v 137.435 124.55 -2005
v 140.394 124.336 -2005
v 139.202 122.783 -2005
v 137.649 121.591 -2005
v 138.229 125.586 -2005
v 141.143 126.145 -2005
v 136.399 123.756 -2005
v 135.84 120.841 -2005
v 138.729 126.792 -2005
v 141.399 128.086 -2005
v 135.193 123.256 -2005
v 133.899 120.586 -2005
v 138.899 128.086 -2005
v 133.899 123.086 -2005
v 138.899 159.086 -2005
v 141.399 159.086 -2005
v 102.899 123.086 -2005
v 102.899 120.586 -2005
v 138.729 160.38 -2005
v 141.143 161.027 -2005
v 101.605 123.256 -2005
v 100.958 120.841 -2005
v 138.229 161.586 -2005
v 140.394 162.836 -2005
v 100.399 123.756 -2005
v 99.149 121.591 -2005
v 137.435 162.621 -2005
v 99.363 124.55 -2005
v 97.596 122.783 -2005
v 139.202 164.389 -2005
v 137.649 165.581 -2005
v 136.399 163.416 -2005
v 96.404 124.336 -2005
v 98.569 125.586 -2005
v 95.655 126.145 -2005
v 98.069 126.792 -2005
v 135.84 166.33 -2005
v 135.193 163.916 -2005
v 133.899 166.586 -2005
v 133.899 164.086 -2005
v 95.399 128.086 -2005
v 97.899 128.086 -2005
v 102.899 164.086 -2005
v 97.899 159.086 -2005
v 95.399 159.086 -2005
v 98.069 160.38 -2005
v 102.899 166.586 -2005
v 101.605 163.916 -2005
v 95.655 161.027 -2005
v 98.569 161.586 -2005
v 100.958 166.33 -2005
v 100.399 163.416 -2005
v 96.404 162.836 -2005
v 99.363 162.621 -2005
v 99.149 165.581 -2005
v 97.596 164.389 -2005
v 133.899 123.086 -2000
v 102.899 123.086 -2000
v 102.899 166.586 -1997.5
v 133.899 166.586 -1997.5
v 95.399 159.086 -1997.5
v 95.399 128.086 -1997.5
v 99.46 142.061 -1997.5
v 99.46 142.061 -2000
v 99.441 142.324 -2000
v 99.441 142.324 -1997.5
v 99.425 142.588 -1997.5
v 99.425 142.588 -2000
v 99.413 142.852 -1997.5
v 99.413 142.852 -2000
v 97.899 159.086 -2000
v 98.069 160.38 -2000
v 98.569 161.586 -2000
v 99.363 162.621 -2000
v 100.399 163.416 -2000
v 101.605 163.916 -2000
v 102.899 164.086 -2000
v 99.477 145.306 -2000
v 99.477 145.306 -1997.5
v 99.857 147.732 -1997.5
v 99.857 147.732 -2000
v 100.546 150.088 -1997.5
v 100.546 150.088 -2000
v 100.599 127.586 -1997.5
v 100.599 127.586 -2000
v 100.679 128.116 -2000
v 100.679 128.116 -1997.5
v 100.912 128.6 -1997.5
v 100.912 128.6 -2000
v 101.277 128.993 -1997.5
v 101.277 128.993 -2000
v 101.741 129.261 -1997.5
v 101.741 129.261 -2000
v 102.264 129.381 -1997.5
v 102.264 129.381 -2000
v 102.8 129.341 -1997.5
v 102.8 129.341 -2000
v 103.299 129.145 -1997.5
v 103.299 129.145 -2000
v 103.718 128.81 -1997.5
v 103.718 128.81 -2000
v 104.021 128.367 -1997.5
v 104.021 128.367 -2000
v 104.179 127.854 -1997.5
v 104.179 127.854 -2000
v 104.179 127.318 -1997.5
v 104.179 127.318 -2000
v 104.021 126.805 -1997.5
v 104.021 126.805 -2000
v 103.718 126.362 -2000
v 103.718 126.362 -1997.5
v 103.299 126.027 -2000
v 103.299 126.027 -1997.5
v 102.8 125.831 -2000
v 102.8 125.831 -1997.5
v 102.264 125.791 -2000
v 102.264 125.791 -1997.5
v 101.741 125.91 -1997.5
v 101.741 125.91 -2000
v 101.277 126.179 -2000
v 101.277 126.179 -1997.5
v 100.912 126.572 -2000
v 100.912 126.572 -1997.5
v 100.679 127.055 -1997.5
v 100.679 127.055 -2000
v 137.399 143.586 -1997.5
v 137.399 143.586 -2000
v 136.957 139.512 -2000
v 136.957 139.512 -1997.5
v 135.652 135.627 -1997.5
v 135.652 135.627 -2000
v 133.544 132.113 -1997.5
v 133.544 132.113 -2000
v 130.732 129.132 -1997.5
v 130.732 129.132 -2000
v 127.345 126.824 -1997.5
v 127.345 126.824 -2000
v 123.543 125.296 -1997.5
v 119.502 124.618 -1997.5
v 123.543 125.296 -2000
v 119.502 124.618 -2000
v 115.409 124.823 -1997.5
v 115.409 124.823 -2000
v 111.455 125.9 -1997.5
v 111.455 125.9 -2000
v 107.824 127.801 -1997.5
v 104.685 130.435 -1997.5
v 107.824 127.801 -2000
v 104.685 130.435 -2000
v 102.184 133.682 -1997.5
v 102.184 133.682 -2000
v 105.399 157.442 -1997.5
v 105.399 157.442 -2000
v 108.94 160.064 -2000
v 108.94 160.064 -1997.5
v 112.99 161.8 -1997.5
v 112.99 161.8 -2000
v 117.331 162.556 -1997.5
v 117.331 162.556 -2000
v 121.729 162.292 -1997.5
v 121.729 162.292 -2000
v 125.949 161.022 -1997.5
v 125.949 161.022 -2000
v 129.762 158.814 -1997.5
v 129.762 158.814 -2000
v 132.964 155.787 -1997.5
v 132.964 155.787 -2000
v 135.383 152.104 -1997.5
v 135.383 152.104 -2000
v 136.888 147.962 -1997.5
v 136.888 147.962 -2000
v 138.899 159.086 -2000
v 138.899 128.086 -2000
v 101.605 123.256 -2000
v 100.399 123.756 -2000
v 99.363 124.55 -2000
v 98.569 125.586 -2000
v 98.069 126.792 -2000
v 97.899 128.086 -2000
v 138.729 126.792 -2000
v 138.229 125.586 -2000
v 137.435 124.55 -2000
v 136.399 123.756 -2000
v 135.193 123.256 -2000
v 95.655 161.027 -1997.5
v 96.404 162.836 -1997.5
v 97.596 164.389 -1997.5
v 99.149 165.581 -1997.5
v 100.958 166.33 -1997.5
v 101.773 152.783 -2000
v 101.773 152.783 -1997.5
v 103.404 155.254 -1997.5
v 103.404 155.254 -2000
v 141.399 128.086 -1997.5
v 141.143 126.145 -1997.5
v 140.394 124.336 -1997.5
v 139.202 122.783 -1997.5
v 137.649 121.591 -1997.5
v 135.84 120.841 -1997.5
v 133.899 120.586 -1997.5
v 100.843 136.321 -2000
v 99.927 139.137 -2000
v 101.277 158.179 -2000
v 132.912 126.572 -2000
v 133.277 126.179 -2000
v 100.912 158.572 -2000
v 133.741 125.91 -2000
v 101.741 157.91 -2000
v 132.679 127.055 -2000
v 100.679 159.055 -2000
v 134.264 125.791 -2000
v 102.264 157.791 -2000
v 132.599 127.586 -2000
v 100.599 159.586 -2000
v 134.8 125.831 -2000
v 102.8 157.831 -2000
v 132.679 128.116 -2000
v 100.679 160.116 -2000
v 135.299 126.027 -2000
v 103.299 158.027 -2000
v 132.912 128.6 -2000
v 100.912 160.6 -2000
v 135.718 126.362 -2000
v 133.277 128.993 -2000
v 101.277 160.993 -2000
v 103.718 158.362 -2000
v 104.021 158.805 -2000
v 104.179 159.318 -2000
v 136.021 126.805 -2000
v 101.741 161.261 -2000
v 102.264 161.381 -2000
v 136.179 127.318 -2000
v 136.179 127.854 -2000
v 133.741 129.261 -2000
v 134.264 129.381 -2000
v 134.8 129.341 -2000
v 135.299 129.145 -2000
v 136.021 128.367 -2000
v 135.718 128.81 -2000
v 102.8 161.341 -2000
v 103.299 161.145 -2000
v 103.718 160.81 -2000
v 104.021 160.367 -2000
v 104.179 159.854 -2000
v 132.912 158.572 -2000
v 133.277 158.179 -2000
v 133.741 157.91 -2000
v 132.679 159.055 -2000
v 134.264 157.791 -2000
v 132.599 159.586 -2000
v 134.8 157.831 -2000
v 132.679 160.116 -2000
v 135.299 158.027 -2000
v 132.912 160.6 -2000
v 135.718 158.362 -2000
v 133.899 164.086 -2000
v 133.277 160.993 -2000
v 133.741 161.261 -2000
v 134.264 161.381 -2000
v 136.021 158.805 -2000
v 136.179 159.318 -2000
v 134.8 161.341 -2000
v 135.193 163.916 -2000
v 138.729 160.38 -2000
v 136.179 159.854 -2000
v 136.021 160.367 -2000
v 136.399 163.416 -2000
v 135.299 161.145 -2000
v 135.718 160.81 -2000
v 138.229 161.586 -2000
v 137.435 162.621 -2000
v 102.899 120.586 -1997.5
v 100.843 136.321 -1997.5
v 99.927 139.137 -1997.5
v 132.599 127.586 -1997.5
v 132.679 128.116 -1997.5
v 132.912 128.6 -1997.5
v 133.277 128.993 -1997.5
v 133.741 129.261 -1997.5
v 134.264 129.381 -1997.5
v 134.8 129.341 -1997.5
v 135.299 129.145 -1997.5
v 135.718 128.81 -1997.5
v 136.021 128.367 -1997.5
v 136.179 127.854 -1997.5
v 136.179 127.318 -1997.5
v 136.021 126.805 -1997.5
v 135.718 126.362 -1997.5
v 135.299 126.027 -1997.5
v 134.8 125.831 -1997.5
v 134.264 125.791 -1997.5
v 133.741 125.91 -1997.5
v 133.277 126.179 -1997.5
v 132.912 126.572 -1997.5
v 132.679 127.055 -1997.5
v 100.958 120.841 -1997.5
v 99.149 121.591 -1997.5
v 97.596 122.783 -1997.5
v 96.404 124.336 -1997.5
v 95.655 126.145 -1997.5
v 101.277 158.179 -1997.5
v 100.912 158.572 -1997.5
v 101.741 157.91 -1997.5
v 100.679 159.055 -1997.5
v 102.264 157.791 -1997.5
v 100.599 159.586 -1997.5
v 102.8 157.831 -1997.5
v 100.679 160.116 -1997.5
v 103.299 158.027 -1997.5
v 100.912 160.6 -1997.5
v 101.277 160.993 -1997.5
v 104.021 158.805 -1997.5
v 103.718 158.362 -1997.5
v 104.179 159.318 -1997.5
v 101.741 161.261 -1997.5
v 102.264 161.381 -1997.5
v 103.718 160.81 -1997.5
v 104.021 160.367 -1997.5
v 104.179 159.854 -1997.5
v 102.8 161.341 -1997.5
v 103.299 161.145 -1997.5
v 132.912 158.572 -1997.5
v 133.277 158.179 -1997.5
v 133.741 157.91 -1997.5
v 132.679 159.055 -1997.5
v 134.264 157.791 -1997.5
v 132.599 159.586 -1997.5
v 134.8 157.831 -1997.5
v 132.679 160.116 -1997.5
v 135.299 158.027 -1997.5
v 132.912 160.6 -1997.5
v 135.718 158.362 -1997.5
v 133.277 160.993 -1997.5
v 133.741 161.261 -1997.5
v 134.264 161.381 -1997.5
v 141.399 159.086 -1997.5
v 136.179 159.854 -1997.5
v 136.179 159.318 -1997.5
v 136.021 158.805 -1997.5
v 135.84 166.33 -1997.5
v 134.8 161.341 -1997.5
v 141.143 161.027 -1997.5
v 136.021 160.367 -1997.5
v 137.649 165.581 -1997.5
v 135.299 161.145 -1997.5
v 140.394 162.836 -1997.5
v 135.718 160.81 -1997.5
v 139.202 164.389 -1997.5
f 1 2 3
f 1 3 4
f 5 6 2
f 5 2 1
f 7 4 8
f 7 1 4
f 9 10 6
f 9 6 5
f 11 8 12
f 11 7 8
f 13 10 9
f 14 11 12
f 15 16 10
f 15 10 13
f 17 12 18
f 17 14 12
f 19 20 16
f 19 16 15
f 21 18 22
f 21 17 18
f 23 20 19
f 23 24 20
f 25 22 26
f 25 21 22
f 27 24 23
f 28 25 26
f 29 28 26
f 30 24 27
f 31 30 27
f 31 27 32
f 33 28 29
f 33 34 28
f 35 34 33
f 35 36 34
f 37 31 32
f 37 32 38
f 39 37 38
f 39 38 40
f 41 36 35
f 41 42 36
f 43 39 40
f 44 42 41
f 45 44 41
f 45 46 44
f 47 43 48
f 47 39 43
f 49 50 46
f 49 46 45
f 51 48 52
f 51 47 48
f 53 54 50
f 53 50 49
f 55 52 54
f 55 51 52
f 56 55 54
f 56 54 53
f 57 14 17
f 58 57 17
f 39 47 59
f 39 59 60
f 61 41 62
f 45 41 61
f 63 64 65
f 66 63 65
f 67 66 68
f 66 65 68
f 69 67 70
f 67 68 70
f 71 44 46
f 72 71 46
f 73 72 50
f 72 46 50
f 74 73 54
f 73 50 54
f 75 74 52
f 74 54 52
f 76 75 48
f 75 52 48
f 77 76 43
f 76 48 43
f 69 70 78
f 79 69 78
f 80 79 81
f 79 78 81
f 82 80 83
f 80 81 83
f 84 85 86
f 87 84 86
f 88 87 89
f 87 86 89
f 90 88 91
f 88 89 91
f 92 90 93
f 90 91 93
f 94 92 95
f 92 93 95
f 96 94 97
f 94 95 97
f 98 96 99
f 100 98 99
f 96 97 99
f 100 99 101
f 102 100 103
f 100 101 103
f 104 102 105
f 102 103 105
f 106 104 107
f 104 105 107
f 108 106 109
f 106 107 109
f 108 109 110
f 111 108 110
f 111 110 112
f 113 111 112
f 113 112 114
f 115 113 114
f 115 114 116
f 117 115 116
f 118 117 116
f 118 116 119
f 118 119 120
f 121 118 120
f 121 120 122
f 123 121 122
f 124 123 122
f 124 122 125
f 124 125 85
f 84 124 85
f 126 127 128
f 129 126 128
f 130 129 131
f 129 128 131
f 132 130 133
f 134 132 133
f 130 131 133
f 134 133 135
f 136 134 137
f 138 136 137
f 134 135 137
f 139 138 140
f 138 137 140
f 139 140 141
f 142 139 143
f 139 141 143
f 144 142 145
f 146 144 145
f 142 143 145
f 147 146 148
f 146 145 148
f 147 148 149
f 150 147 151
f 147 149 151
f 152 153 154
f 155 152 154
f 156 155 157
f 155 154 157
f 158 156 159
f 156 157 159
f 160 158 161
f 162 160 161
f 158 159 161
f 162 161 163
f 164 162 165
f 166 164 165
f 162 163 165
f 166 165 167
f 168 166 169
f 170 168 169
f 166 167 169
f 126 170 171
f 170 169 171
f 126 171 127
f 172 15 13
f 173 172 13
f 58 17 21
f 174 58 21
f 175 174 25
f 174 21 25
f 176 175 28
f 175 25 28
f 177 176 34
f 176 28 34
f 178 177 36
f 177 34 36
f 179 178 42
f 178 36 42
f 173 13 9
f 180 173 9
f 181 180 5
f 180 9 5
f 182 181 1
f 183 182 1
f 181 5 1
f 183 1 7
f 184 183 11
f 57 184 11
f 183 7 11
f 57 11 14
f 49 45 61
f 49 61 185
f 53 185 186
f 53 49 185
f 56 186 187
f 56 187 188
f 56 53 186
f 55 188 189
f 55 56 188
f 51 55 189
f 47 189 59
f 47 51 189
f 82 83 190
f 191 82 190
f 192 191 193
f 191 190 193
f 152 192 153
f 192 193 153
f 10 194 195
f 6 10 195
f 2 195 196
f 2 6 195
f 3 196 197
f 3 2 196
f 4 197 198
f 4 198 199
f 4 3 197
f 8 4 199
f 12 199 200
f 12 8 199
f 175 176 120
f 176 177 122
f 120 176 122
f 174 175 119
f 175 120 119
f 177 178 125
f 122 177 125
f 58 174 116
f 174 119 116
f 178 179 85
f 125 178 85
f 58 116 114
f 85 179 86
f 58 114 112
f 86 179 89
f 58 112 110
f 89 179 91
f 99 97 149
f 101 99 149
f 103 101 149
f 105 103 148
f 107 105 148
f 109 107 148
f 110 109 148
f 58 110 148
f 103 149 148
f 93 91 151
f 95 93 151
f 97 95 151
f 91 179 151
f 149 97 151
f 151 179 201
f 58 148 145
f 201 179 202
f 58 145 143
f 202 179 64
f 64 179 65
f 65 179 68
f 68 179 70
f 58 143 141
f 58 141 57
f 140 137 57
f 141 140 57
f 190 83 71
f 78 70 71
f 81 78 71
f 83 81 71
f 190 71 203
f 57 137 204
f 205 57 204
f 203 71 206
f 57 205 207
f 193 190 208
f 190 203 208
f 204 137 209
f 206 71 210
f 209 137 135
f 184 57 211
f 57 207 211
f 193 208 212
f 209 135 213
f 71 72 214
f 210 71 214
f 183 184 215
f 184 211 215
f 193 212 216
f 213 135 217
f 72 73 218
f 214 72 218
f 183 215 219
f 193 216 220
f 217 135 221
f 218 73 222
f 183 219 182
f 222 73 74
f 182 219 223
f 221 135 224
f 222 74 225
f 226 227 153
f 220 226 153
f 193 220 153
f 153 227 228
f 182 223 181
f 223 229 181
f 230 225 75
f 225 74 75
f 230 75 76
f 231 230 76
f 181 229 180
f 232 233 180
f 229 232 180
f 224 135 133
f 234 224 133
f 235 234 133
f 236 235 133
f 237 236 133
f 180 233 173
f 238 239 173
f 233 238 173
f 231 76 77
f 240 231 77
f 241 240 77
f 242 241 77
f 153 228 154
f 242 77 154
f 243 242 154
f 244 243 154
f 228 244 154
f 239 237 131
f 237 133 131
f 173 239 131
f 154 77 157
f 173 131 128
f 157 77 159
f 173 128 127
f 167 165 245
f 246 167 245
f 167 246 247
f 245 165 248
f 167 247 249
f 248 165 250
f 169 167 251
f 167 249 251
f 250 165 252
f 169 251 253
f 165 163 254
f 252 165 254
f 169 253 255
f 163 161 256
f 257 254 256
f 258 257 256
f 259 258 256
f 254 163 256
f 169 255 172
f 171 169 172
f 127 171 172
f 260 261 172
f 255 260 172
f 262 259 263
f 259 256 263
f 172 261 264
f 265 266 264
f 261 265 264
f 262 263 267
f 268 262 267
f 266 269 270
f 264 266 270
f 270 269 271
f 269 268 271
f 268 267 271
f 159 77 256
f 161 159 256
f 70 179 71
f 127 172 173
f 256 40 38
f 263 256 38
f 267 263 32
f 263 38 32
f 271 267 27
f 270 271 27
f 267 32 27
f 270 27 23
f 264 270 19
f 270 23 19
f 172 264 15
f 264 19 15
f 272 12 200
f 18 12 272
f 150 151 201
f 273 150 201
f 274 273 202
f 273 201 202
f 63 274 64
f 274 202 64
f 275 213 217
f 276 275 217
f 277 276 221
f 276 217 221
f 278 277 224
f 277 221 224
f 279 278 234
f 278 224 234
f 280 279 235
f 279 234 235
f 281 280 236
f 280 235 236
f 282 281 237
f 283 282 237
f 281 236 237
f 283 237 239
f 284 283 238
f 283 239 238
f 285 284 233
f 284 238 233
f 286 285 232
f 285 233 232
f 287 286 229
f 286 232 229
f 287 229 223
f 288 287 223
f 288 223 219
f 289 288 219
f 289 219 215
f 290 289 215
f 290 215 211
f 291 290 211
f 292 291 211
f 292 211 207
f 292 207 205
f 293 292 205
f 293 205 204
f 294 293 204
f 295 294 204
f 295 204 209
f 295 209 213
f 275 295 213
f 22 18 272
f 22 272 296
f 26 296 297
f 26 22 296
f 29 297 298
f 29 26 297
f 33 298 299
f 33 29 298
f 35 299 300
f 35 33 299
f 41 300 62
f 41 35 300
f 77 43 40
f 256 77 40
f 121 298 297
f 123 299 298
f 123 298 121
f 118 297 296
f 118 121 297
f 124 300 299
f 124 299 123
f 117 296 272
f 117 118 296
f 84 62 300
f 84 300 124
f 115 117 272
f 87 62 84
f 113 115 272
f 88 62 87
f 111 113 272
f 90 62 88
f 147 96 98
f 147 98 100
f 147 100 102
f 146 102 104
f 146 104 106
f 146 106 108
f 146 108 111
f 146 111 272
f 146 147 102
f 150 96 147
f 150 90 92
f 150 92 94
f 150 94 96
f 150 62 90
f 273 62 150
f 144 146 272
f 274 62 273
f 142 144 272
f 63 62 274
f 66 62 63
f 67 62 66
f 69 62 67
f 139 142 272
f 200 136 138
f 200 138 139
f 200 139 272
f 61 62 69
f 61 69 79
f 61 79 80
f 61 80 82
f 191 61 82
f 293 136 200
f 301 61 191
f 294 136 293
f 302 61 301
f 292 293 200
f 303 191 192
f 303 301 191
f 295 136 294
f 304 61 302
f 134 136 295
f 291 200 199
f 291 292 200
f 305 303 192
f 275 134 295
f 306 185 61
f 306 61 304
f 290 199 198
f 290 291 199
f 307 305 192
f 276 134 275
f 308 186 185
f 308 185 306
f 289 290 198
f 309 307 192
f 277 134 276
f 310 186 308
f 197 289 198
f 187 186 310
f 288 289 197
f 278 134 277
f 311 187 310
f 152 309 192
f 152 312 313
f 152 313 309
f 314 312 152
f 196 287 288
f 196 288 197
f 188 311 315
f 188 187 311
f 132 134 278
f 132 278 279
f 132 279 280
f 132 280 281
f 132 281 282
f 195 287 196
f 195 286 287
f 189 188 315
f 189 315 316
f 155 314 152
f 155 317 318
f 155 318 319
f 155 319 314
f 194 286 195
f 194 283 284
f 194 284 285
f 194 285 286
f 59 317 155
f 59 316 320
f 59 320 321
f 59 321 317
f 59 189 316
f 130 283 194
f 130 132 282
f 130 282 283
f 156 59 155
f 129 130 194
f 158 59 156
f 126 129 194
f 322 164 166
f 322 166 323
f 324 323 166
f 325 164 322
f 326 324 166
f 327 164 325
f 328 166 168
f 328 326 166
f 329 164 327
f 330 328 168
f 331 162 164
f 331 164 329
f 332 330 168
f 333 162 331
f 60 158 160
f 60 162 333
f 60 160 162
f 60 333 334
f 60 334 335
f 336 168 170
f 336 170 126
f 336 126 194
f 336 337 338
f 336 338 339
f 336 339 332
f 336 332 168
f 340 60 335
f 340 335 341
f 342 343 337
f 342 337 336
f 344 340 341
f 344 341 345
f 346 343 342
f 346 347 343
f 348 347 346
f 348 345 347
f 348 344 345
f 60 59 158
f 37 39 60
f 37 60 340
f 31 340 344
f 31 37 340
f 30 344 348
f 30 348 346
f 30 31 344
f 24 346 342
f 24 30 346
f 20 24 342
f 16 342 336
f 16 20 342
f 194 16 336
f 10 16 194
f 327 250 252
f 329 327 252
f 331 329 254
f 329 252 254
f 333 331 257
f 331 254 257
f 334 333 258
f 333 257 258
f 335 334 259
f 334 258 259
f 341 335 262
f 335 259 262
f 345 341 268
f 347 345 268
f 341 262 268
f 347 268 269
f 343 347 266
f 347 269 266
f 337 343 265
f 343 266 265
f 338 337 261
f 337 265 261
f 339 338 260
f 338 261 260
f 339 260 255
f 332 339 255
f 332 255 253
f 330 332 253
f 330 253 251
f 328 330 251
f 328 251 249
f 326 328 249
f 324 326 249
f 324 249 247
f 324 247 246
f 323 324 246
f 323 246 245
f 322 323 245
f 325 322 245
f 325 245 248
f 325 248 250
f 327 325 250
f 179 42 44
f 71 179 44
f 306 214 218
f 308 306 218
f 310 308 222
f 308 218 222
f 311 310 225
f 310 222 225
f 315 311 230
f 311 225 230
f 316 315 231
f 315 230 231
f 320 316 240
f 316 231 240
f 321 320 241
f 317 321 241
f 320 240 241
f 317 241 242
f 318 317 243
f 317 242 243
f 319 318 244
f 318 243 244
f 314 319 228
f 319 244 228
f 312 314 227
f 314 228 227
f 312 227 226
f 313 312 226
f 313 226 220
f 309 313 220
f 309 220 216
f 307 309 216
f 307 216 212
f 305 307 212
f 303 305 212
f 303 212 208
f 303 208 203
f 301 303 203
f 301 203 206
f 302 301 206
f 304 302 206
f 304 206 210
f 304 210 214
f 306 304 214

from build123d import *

# Parameters (mm, degrees)
BOSS_EXTRUDE2_DEPTH  = 2.5
BOSS_EXTRUDE3_START  = 5
BOSS_EXTRUDE3_DEPTH  = 5
M3_CLEARANCE_HOLE1_D = 3.6


with BuildPart() as part:
    # Sketch2 → Boss-Extrude2 (new body)
    # profile 1 of 2: a face of its own
    with BuildSketch(Plane.XY.offset(-2000)):
        with BuildLine():
            Line((102.89897186, 166.585877116), (133.89897186, 166.585877116))
            ThreePointArc((133.89897186, 166.585877116), (139.202272719, 164.389177975), (141.39897186, 159.085877116))
            Line((141.39897186, 159.085877116), (141.39897186, 138.785877116))
            Line((141.39897186, 138.785877116), (141.39897186, 135.685877116))
            Line((141.39897186, 135.685877116), (141.39897186, 135.385877116))
            Line((141.39897186, 135.385877116), (141.39897186, 133.385877116))
            Line((141.39897186, 133.385877116), (141.39897186, 133.085877116))
            Line((141.39897186, 133.085877116), (141.39897186, 131.333076667))
            Line((141.39897186, 131.333076667), (141.39897186, 128.085877116))
            ThreePointArc((141.39897186, 128.085877116), (139.202272719, 122.782576257), (133.89897186, 120.585877116))
            Line((133.89897186, 120.585877116), (102.89897186, 120.585877116))
            ThreePointArc((102.89897186, 120.585877116), (97.595671001, 122.782576257), (95.39897186, 128.085877116))
            Line((95.39897186, 128.085877116), (95.39897186, 159.085877116))
            ThreePointArc((95.39897186, 159.085877116), (97.595671001, 164.389177975), (102.89897186, 166.585877116))
        make_face()
        with BuildLine():
            ThreePointArc((138.89897186, 159.085877116), (137.434505766, 162.621411022), (133.89897186, 164.085877116))
            Line((133.89897186, 164.085877116), (102.89897186, 164.085877116))
            ThreePointArc((102.89897186, 164.085877116), (99.363437954, 162.621411022), (97.89897186, 159.085877116))
            Line((97.89897186, 159.085877116), (97.89897186, 128.085877116))
            ThreePointArc((97.89897186, 128.085877116), (99.363437954, 124.55034321), (102.89897186, 123.085877116))
            Line((102.89897186, 123.085877116), (133.89897186, 123.085877116))
            ThreePointArc((133.89897186, 123.085877116), (137.434505766, 124.55034321), (138.89897186, 128.085877116))
            Line((138.89897186, 128.085877116), (138.89897186, 131.333076667))
            Line((138.89897186, 131.333076667), (138.89897186, 133.085877116))
            Line((138.89897186, 133.085877116), (138.89897186, 133.385877116))
            Line((138.89897186, 133.385877116), (138.89897186, 135.385877116))
            Line((138.89897186, 135.385877116), (138.89897186, 135.685877116))
            Line((138.89897186, 135.685877116), (138.89897186, 138.785877116))
            Line((138.89897186, 138.785877116), (138.89897186, 159.085877116))
        make_face(mode=Mode.SUBTRACT)
    # profile 2 of 2: a face of its own
    with BuildSketch(Plane.XY.offset(-2000)):
        with BuildLine():
            Line((138.89897186, 135.685877116), (138.89897186, 138.785877116))
            Line((138.89897186, 138.785877116), (138.89897186, 159.085877116))
            ThreePointArc((138.89897186, 159.085877116), (137.434505766, 162.621411022), (133.89897186, 164.085877116))
            Line((133.89897186, 164.085877116), (102.89897186, 164.085877116))
            ThreePointArc((102.89897186, 164.085877116), (99.363437954, 162.621411022), (97.89897186, 159.085877116))
            Line((97.89897186, 159.085877116), (97.89897186, 128.085877116))
            ThreePointArc((97.89897186, 128.085877116), (99.363437954, 124.55034321), (102.89897186, 123.085877116))
            Line((102.89897186, 123.085877116), (133.89897186, 123.085877116))
            ThreePointArc((133.89897186, 123.085877116), (137.434505766, 124.55034321), (138.89897186, 128.085877116))
            Line((138.89897186, 128.085877116), (138.89897186, 131.333076667))
            Line((138.89897186, 131.333076667), (138.89897186, 133.085877116))
            Line((138.89897186, 133.085877116), (138.89897186, 133.385877116))
            Line((138.89897186, 133.385877116), (138.89897186, 135.385877116))
            Line((138.89897186, 135.385877116), (138.89897186, 135.685877116))
        make_face()
        with BuildLine():
            ThreePointArc((99.460267487, 142.060925747), (99.432576344, 142.456345732), (99.413140247, 142.85225734))
            ThreePointArc((99.413140247, 142.85225734), (99.62769877, 146.525146856), (100.54610998, 150.087824725))
            ThreePointArc((100.54610998, 150.087824725), (102.540191704, 154.050058497), (105.398627834, 157.441960805))
            ThreePointArc((105.398627834, 157.441960805), (125.948589847, 161.021566614), (137.39897186, 143.585877116))
            ThreePointArc((137.39897186, 143.585877116), (123.543114722, 125.295502757), (102.184467206, 133.681845673))
            ThreePointArc((102.184467206, 133.681845673), (100.329957721, 137.711293892), (99.460267487, 142.060925747))
        make_face(mode=Mode.SUBTRACT)
    extrude(amount=BOSS_EXTRUDE2_DEPTH)

    # Sketch4 → Boss-Extrude3 (add)
    with BuildSketch(Plane(origin=(0, 0, -2000), x_dir=(-1, 0, 0), z_dir=(0, 0, -1)).offset(BOSS_EXTRUDE3_START)):
        with BuildLine():
            Line((-102.89897186, 166.585877116), (-133.89897186, 166.585877116))
            ThreePointArc((-133.89897186, 166.585877116), (-139.202272719, 164.389177975), (-141.39897186, 159.085877116))
            Line((-141.39897186, 159.085877116), (-141.39897186, 128.085877116))
            ThreePointArc((-141.39897186, 128.085877116), (-139.202272719, 122.782576257), (-133.89897186, 120.585877116))
            Line((-133.89897186, 120.585877116), (-102.89897186, 120.585877116))
            ThreePointArc((-102.89897186, 120.585877116), (-97.595671001, 122.782576257), (-95.39897186, 128.085877116))
            Line((-95.39897186, 128.085877116), (-95.39897186, 159.085877116))
            ThreePointArc((-95.39897186, 159.085877116), (-97.595671001, 164.389177975), (-102.89897186, 166.585877116))
        make_face()
        with BuildLine():
            Line((-102.89897186, 164.085877116), (-133.89897186, 164.085877116))
            ThreePointArc((-133.89897186, 164.085877116), (-137.434505766, 162.621411022), (-138.89897186, 159.085877116))
            Line((-138.89897186, 159.085877116), (-138.89897186, 128.085877116))
            ThreePointArc((-138.89897186, 128.085877116), (-137.434505766, 124.55034321), (-133.89897186, 123.085877116))
            Line((-133.89897186, 123.085877116), (-102.89897186, 123.085877116))
            ThreePointArc((-102.89897186, 123.085877116), (-99.363437954, 124.55034321), (-97.89897186, 128.085877116))
            Line((-97.89897186, 128.085877116), (-97.89897186, 159.085877116))
            ThreePointArc((-97.89897186, 159.085877116), (-99.363437954, 162.621411022), (-102.89897186, 164.085877116))
        make_face(mode=Mode.SUBTRACT)
    extrude(amount=-BOSS_EXTRUDE3_DEPTH)

    # M3 Clearance Hole1 (through all)
    with Locations(Plane.XY.offset(-1997.5)):
        with Locations((102.39897186, 159.585877116), (102.39897186, 127.585877116), (134.39897186, 127.585877116), (134.39897186, 159.585877116)):
            Hole(M3_CLEARANCE_HOLE1_D / 2)


solid = part.part
